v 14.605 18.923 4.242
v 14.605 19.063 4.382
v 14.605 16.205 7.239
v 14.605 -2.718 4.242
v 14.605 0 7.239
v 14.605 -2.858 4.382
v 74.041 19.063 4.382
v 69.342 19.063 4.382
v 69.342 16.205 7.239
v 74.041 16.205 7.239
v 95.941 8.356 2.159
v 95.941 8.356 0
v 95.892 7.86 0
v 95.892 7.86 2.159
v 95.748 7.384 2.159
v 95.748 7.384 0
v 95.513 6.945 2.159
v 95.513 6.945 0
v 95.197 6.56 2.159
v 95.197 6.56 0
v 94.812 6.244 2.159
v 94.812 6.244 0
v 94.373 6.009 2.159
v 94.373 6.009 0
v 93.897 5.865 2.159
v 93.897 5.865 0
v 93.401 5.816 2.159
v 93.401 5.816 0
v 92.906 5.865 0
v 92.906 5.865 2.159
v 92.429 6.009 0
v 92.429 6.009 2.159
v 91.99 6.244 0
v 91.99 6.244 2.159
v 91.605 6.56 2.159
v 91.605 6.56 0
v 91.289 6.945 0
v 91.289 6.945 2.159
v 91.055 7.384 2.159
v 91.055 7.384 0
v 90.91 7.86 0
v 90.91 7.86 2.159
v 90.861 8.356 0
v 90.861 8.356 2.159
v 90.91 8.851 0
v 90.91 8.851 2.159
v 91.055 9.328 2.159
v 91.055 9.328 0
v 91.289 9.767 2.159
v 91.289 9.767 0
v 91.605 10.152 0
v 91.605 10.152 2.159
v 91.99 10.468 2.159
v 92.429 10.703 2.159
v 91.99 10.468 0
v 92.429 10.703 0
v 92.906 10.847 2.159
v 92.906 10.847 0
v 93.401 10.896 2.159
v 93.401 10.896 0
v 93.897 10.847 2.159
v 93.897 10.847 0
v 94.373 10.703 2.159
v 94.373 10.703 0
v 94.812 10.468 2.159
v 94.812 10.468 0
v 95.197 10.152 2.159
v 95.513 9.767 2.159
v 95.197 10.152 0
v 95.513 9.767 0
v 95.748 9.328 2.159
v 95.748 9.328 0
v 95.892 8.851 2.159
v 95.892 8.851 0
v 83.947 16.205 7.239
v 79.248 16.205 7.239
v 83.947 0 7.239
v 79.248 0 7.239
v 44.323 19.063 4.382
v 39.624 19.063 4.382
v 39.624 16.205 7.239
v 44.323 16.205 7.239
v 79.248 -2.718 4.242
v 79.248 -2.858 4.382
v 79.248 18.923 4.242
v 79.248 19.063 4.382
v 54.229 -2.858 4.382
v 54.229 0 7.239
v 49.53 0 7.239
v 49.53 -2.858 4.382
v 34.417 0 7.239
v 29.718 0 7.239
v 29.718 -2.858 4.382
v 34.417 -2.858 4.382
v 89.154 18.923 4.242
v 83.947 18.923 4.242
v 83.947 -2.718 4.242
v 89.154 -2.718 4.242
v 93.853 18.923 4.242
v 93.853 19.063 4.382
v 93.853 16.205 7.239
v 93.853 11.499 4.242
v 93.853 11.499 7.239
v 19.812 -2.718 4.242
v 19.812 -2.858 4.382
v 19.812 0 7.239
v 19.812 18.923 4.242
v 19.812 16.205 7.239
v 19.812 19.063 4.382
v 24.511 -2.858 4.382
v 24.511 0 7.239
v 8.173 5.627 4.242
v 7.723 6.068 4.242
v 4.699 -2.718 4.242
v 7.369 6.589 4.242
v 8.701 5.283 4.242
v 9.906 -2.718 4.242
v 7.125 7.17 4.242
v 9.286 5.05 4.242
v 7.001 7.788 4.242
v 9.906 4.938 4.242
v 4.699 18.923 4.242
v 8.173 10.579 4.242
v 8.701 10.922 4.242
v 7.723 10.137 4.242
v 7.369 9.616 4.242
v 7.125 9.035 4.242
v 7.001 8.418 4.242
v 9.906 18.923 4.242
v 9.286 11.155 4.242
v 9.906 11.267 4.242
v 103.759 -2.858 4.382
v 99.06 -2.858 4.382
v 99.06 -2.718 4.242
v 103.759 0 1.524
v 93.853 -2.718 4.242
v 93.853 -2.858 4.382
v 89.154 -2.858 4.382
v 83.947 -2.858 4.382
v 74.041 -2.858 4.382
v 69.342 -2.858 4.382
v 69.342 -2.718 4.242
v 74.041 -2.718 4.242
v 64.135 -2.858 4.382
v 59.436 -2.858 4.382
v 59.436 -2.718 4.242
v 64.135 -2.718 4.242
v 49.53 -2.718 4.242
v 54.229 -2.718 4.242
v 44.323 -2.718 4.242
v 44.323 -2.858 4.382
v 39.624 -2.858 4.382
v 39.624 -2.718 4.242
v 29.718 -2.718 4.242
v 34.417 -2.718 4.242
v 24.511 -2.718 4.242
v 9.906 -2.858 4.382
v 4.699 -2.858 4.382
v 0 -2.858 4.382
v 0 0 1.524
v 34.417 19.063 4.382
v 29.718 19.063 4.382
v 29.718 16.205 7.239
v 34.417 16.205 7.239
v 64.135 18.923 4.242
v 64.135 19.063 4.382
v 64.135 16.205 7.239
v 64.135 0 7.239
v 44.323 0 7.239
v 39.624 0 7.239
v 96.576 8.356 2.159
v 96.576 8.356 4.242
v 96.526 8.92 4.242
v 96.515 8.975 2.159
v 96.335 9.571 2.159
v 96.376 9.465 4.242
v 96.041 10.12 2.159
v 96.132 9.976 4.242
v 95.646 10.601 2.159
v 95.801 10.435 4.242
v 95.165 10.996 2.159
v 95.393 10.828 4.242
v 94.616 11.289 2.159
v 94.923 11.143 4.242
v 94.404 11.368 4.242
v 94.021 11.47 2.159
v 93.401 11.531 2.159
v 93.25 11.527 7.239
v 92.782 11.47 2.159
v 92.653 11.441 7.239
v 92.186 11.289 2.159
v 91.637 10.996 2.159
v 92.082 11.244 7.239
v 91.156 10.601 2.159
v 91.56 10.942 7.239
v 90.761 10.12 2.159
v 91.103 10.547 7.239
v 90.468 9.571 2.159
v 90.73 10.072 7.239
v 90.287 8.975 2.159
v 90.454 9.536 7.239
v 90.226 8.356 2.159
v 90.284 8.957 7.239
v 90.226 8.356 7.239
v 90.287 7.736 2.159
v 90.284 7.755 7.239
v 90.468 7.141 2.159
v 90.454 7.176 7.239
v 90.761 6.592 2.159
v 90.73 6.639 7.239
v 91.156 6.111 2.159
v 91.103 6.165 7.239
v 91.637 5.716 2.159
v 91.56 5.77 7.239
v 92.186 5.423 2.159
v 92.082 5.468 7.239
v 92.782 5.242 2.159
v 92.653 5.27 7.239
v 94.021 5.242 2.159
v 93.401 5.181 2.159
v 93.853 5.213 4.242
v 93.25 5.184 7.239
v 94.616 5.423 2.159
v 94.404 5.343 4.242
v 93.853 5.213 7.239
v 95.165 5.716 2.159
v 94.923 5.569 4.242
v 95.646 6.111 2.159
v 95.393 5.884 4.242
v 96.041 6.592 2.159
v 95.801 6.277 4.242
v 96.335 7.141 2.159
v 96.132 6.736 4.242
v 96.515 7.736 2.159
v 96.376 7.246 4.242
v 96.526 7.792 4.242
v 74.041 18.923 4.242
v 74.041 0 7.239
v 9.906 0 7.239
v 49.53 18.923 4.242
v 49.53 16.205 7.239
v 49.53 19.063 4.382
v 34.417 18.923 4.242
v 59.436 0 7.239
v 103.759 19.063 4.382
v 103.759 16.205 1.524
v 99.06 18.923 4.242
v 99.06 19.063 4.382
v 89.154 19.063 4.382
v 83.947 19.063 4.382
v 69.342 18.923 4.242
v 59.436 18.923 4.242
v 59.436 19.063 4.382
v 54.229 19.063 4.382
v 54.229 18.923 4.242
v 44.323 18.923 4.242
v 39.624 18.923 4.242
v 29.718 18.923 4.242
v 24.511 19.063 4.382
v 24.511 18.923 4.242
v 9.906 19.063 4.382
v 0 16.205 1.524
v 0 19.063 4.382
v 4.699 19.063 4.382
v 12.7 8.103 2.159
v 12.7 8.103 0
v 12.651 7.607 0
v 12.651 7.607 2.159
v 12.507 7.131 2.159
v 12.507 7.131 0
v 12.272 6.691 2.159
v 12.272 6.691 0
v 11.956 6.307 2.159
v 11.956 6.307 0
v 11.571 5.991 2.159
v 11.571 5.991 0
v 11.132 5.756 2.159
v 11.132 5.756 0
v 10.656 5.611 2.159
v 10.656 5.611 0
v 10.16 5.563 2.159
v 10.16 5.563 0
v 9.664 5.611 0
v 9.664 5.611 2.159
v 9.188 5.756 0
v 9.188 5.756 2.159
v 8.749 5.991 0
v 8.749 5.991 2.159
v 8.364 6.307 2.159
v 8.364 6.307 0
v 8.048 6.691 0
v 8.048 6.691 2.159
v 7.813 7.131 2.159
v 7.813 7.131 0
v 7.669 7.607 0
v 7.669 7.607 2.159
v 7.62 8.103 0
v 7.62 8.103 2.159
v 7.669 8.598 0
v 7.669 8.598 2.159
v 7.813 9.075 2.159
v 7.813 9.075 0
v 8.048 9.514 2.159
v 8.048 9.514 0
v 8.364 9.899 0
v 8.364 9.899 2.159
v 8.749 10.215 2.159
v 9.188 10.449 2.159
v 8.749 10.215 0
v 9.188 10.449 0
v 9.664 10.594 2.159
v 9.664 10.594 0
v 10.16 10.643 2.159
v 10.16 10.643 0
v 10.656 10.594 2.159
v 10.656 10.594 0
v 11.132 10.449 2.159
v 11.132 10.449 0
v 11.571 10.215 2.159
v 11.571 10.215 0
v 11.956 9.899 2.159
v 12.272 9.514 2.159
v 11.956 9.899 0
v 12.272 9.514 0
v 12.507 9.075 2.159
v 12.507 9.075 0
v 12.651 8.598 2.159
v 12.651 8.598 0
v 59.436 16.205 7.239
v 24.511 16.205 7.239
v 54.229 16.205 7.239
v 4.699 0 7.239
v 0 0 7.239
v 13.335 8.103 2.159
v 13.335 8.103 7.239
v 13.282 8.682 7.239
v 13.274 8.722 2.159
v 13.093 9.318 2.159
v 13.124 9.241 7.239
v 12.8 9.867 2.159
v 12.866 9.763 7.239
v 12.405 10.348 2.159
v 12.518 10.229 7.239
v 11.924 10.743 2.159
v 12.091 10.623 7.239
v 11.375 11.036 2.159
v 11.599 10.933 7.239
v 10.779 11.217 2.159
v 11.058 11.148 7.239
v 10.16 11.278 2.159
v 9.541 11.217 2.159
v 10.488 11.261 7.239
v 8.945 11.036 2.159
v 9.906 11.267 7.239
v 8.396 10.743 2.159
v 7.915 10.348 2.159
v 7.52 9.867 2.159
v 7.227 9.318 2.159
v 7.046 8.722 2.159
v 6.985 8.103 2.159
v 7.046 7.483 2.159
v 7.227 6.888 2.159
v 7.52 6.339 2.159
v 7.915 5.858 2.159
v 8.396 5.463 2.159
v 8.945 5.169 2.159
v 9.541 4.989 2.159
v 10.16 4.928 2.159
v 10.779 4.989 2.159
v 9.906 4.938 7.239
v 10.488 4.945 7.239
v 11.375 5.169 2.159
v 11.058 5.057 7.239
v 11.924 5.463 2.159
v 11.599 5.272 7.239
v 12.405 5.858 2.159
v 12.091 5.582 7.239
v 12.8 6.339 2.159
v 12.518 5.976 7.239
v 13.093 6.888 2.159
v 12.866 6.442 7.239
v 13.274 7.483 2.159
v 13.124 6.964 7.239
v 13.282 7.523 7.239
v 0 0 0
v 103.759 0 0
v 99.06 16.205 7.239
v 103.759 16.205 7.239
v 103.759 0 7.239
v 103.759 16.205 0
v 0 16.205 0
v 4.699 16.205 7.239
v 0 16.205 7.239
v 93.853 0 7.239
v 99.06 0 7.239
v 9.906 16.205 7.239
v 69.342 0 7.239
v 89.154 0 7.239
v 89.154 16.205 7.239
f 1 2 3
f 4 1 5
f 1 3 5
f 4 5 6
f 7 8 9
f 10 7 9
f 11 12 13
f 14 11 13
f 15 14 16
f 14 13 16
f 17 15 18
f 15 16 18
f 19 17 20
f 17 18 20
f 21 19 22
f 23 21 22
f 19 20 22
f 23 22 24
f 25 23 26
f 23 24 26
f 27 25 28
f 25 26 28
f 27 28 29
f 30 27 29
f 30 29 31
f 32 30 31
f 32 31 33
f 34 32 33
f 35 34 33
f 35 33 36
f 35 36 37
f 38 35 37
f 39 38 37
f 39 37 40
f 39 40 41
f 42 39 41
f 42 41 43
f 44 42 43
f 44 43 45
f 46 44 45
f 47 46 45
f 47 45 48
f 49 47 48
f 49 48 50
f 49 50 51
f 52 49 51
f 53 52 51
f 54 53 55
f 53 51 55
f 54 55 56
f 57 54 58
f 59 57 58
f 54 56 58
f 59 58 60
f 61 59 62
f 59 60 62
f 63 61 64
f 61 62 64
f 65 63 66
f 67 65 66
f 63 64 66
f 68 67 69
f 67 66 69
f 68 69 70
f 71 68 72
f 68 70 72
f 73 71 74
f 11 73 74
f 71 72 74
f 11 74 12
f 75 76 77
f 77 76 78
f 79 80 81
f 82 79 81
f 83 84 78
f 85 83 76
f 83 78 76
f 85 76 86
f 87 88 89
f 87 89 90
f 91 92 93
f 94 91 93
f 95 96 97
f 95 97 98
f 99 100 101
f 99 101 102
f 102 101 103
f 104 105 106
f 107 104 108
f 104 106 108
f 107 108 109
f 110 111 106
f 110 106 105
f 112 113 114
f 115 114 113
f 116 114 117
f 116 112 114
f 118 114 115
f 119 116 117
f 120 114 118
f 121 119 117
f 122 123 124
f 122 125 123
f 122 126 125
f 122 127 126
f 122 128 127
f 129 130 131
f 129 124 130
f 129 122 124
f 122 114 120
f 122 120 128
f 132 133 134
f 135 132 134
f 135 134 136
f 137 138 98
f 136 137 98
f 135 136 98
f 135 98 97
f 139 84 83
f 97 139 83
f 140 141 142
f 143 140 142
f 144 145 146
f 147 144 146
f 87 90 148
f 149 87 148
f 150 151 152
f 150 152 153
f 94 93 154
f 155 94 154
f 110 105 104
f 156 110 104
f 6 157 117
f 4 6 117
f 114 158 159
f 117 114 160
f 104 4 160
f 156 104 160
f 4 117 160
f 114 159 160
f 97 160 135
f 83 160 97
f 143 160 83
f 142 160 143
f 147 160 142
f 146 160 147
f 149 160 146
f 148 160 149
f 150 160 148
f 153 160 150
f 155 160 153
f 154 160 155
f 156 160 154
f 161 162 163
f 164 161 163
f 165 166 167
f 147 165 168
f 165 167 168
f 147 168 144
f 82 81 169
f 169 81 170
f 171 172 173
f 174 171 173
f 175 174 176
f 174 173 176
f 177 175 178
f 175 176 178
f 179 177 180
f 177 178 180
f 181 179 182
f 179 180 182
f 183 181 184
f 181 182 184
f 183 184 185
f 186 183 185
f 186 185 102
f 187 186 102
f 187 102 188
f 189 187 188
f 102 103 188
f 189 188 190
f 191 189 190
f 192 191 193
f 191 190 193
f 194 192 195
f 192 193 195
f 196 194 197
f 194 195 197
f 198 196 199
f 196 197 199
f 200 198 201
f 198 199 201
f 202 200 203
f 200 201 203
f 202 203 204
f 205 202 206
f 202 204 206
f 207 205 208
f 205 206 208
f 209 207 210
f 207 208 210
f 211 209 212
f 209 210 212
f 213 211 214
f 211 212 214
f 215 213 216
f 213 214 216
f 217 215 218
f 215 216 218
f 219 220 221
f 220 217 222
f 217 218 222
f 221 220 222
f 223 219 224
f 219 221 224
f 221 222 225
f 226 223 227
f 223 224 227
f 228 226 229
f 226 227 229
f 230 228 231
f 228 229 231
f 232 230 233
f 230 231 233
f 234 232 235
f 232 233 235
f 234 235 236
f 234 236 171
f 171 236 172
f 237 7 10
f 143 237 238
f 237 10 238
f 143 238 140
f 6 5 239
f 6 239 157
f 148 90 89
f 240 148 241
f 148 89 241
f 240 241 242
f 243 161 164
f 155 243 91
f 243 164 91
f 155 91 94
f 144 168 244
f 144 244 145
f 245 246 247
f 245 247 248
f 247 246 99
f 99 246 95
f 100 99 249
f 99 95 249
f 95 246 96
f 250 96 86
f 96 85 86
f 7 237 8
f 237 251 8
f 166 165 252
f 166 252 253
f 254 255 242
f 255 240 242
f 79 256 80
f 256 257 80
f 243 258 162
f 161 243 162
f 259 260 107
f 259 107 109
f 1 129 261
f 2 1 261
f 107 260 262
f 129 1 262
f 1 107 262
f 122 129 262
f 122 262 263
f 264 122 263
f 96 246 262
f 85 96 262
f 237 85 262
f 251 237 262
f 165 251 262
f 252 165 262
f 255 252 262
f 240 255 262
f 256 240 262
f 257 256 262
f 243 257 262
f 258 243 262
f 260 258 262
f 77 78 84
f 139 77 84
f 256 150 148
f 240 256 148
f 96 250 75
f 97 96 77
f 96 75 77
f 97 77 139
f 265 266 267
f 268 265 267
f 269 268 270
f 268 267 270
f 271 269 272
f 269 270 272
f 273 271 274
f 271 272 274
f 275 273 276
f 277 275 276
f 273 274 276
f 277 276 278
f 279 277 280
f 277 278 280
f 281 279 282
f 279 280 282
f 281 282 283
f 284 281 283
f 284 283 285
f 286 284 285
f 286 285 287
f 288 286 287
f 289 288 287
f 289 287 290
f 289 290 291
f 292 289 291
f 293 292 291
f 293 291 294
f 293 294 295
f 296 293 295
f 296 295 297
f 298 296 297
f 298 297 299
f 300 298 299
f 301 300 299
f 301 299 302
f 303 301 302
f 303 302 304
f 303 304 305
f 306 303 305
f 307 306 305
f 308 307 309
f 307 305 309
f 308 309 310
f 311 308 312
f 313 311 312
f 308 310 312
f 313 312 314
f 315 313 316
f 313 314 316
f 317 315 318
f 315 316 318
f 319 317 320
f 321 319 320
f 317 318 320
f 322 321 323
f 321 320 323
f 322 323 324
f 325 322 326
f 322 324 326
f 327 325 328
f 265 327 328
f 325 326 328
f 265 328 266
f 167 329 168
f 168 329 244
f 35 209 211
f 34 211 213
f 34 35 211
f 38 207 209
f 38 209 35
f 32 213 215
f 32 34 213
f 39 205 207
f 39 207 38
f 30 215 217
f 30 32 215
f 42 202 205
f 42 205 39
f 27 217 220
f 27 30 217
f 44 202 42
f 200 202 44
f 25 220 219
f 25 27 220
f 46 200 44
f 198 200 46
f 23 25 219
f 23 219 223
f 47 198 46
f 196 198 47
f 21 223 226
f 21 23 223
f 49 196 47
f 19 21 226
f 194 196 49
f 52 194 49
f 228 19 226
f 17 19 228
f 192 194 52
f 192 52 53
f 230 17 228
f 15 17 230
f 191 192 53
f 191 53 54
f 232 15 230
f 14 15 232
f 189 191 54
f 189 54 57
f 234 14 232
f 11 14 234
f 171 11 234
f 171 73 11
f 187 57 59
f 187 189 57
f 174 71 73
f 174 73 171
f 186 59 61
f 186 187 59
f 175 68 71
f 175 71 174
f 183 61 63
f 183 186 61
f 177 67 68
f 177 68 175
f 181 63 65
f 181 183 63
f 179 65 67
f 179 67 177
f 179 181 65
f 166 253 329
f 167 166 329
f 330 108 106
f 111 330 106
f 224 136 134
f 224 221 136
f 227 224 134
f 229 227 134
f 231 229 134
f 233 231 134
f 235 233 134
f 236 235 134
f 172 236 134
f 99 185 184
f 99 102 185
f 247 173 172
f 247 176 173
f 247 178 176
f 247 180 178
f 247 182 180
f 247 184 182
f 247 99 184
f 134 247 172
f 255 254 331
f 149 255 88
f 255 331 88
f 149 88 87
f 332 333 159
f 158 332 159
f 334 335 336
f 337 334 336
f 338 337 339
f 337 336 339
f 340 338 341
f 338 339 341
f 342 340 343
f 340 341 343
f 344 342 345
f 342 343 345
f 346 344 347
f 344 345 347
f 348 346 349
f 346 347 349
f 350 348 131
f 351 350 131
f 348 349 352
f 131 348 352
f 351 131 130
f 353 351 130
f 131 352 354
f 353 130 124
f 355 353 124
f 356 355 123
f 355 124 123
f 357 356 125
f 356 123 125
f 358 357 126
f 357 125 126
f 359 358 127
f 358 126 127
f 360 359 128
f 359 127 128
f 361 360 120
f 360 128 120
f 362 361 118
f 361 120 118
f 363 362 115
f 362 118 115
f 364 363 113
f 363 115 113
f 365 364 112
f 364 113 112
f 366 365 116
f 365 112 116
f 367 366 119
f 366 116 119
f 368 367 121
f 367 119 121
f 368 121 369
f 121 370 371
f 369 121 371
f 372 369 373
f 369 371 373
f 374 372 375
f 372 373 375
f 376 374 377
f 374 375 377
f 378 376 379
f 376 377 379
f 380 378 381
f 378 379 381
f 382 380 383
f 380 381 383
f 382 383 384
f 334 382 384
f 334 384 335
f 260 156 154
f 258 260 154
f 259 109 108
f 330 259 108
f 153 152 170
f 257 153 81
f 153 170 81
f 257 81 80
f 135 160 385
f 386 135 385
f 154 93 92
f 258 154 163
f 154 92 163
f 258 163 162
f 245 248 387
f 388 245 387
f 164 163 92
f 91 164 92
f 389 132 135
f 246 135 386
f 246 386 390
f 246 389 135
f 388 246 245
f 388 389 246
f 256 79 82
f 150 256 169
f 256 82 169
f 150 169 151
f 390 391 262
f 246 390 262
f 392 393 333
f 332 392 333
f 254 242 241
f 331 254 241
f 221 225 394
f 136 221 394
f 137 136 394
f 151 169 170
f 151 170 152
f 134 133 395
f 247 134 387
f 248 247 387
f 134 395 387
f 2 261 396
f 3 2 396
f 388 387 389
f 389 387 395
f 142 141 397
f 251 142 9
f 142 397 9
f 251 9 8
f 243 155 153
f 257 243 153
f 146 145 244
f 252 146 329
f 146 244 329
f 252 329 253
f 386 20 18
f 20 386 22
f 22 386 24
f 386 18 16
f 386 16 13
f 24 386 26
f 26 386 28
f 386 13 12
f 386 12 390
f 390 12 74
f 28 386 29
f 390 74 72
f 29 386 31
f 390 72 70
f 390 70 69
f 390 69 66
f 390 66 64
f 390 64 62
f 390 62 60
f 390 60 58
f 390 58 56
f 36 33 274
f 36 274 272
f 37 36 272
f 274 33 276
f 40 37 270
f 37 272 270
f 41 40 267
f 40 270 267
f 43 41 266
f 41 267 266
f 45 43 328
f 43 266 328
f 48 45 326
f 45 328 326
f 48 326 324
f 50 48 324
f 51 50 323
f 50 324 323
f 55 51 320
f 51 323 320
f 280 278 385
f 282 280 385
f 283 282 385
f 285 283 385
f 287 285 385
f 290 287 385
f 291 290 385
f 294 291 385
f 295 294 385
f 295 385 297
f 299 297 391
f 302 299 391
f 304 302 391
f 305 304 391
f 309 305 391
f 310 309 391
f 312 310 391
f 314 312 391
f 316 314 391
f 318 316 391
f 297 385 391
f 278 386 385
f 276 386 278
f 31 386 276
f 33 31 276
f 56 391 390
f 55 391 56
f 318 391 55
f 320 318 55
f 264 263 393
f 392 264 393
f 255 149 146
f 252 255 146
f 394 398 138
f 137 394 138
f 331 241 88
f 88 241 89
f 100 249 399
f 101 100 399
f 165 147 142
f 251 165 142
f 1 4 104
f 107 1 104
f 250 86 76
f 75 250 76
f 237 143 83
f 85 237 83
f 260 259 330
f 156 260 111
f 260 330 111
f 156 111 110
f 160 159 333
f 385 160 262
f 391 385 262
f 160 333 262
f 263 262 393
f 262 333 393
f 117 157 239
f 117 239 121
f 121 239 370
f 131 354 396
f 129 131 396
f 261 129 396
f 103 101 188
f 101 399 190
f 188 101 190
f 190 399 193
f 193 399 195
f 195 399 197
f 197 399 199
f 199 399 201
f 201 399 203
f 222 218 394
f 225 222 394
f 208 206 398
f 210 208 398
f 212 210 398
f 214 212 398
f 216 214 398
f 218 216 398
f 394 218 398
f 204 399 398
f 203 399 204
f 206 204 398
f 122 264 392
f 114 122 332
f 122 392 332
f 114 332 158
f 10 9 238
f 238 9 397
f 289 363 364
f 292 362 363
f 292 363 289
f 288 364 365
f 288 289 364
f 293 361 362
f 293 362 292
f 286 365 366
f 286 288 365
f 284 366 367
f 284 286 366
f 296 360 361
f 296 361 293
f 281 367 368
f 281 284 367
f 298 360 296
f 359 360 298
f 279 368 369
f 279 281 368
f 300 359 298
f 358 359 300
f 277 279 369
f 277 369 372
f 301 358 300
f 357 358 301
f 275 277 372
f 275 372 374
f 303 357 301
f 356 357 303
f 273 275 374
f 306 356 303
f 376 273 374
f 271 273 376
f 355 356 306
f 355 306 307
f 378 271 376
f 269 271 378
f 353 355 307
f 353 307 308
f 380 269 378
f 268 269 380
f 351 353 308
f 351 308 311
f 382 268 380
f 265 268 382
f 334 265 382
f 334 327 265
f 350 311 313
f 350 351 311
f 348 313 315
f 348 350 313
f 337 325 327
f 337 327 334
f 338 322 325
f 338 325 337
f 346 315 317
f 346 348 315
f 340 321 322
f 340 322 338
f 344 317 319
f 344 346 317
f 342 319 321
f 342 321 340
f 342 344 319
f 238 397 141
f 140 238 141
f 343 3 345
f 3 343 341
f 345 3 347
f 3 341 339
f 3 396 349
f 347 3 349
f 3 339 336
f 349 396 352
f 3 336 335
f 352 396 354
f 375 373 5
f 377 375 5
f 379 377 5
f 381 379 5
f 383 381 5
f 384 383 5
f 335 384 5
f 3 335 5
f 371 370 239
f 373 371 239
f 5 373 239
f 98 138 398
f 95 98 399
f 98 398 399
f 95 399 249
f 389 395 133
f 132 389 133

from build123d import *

# Parameters (mm, degrees)
F1_DEPTH = 103.759
F2_W     = 5.207
F2_H     = 2.8575
F2_H_2   = 16.2052
F2_H_3   = 2.9408035447
F3_DEPTH = 2.9972
F4_R     = 2.54
F5_DEPTH = 7.239
F6_R     = 3.175
F7_DEPTH = 5.08


with BuildPart() as f1:
    # F0 (on Right) → F1 (new body)
    with BuildSketch(Plane.YZ):
        Polygon((0, 1.524), (0, 0), (16.2052, 0), (16.2052, 1.524), (19.0627, 4.3815), (16.2052, 7.239), (0, 7.239), (-2.8575, 4.3815), align=None)
    extrude(amount=F1_DEPTH)

    # F2 (on face) → F3 (cut)
    with BuildSketch(Plane.XY.offset(7.239)):
        with Locations((7.3025, -1.42875)):
            Rectangle(F2_W, F2_H)
        Polygon((4.699, 16.2052), (4.699, 8.1026), (4.699, 0), (9.906, 0), (9.906, 16.2052), align=None)
        with Locations((7.3025, 17.63395)):
            Rectangle(F2_W, F2_H)
        with Locations((17.2085, 17.63395)):
            Rectangle(F2_W, F2_H)
        with Locations((17.2085, 8.1026)):
            Rectangle(F2_W, F2_H_2)
        with Locations((17.2085, -1.42875)):
            Rectangle(F2_W, F2_H)
        with Locations((27.1145, 17.63395)):
            Rectangle(F2_W, F2_H)
        with Locations((27.1145, 8.1026)):
            Rectangle(F2_W, F2_H_2)
        with Locations((27.1145, -1.42875)):
            Rectangle(F2_W, F2_H)
        with Locations((37.0205, 17.63395)):
            Rectangle(F2_W, F2_H)
        with Locations((37.0205, 8.1026)):
            Rectangle(F2_W, F2_H_2)
        with Locations((37.0205, -1.42875)):
            Rectangle(F2_W, F2_H)
        with Locations((46.9265, 17.63395)):
            Rectangle(F2_W, F2_H)
        with Locations((46.9265, 8.1026)):
            Rectangle(F2_W, F2_H_2)
        with Locations((46.9265, -1.42875)):
            Rectangle(F2_W, F2_H)
        with Locations((56.8325, 17.63395)):
            Rectangle(F2_W, F2_H)
        with Locations((56.8325, 8.1026)):
            Rectangle(F2_W, F2_H_2)
        with Locations((56.8325, -1.42875)):
            Rectangle(F2_W, F2_H)
        with Locations((66.7385, 17.63395)):
            Rectangle(F2_W, F2_H)
        with Locations((66.7385, 8.1026)):
            Rectangle(F2_W, F2_H_2)
        with Locations((66.7385, -1.42875)):
            Rectangle(F2_W, F2_H)
        with Locations((76.6445, 17.63395)):
            Rectangle(F2_W, F2_H)
        with Locations((76.6445, 8.1026)):
            Rectangle(F2_W, F2_H_2)
        with Locations((76.6445, -1.42875)):
            Rectangle(F2_W, F2_H)
        with Locations((86.5505, -1.42875)):
            Rectangle(F2_W, F2_H)
        with Locations((86.5505, 8.1026)):
            Rectangle(F2_W, F2_H_2)
        with Locations((86.5505, 17.63395)):
            Rectangle(F2_W, F2_H)
        with Locations((96.4565, 17.6756017723)):
            Rectangle(F2_W, F2_H_3)
        with Locations((96.4565, 8.1026)):
            Rectangle(F2_W, F2_H_2)
        with Locations((96.4565, -1.4704017723)):
            Rectangle(F2_W, F2_H_3)
    extrude(amount=-F3_DEPTH, mode=Mode.SUBTRACT)

    # F4 (on face) → F5 (cut)
    with BuildSketch(Plane(origin=(0, 0, 0), x_dir=(1, 0, 0), z_dir=(0, 0, -1))):
        with Locations((93.4012121817, -8.3558605984)):
            Circle(F4_R)
        with Locations((10.16, -8.1026)):
            Circle(F4_R)
    extrude(amount=-F5_DEPTH, mode=Mode.SUBTRACT)

    # F6 (on face) → F7 (cut)
    with BuildSketch(Plane.XY.offset(7.239)):
        with Locations((93.4012121817, 8.3558605984)):
            Circle(F6_R)
        with Locations((10.16, 8.1026)):
            Circle(F6_R)
    extrude(amount=-F7_DEPTH, mode=Mode.SUBTRACT)


solid = f1.part
